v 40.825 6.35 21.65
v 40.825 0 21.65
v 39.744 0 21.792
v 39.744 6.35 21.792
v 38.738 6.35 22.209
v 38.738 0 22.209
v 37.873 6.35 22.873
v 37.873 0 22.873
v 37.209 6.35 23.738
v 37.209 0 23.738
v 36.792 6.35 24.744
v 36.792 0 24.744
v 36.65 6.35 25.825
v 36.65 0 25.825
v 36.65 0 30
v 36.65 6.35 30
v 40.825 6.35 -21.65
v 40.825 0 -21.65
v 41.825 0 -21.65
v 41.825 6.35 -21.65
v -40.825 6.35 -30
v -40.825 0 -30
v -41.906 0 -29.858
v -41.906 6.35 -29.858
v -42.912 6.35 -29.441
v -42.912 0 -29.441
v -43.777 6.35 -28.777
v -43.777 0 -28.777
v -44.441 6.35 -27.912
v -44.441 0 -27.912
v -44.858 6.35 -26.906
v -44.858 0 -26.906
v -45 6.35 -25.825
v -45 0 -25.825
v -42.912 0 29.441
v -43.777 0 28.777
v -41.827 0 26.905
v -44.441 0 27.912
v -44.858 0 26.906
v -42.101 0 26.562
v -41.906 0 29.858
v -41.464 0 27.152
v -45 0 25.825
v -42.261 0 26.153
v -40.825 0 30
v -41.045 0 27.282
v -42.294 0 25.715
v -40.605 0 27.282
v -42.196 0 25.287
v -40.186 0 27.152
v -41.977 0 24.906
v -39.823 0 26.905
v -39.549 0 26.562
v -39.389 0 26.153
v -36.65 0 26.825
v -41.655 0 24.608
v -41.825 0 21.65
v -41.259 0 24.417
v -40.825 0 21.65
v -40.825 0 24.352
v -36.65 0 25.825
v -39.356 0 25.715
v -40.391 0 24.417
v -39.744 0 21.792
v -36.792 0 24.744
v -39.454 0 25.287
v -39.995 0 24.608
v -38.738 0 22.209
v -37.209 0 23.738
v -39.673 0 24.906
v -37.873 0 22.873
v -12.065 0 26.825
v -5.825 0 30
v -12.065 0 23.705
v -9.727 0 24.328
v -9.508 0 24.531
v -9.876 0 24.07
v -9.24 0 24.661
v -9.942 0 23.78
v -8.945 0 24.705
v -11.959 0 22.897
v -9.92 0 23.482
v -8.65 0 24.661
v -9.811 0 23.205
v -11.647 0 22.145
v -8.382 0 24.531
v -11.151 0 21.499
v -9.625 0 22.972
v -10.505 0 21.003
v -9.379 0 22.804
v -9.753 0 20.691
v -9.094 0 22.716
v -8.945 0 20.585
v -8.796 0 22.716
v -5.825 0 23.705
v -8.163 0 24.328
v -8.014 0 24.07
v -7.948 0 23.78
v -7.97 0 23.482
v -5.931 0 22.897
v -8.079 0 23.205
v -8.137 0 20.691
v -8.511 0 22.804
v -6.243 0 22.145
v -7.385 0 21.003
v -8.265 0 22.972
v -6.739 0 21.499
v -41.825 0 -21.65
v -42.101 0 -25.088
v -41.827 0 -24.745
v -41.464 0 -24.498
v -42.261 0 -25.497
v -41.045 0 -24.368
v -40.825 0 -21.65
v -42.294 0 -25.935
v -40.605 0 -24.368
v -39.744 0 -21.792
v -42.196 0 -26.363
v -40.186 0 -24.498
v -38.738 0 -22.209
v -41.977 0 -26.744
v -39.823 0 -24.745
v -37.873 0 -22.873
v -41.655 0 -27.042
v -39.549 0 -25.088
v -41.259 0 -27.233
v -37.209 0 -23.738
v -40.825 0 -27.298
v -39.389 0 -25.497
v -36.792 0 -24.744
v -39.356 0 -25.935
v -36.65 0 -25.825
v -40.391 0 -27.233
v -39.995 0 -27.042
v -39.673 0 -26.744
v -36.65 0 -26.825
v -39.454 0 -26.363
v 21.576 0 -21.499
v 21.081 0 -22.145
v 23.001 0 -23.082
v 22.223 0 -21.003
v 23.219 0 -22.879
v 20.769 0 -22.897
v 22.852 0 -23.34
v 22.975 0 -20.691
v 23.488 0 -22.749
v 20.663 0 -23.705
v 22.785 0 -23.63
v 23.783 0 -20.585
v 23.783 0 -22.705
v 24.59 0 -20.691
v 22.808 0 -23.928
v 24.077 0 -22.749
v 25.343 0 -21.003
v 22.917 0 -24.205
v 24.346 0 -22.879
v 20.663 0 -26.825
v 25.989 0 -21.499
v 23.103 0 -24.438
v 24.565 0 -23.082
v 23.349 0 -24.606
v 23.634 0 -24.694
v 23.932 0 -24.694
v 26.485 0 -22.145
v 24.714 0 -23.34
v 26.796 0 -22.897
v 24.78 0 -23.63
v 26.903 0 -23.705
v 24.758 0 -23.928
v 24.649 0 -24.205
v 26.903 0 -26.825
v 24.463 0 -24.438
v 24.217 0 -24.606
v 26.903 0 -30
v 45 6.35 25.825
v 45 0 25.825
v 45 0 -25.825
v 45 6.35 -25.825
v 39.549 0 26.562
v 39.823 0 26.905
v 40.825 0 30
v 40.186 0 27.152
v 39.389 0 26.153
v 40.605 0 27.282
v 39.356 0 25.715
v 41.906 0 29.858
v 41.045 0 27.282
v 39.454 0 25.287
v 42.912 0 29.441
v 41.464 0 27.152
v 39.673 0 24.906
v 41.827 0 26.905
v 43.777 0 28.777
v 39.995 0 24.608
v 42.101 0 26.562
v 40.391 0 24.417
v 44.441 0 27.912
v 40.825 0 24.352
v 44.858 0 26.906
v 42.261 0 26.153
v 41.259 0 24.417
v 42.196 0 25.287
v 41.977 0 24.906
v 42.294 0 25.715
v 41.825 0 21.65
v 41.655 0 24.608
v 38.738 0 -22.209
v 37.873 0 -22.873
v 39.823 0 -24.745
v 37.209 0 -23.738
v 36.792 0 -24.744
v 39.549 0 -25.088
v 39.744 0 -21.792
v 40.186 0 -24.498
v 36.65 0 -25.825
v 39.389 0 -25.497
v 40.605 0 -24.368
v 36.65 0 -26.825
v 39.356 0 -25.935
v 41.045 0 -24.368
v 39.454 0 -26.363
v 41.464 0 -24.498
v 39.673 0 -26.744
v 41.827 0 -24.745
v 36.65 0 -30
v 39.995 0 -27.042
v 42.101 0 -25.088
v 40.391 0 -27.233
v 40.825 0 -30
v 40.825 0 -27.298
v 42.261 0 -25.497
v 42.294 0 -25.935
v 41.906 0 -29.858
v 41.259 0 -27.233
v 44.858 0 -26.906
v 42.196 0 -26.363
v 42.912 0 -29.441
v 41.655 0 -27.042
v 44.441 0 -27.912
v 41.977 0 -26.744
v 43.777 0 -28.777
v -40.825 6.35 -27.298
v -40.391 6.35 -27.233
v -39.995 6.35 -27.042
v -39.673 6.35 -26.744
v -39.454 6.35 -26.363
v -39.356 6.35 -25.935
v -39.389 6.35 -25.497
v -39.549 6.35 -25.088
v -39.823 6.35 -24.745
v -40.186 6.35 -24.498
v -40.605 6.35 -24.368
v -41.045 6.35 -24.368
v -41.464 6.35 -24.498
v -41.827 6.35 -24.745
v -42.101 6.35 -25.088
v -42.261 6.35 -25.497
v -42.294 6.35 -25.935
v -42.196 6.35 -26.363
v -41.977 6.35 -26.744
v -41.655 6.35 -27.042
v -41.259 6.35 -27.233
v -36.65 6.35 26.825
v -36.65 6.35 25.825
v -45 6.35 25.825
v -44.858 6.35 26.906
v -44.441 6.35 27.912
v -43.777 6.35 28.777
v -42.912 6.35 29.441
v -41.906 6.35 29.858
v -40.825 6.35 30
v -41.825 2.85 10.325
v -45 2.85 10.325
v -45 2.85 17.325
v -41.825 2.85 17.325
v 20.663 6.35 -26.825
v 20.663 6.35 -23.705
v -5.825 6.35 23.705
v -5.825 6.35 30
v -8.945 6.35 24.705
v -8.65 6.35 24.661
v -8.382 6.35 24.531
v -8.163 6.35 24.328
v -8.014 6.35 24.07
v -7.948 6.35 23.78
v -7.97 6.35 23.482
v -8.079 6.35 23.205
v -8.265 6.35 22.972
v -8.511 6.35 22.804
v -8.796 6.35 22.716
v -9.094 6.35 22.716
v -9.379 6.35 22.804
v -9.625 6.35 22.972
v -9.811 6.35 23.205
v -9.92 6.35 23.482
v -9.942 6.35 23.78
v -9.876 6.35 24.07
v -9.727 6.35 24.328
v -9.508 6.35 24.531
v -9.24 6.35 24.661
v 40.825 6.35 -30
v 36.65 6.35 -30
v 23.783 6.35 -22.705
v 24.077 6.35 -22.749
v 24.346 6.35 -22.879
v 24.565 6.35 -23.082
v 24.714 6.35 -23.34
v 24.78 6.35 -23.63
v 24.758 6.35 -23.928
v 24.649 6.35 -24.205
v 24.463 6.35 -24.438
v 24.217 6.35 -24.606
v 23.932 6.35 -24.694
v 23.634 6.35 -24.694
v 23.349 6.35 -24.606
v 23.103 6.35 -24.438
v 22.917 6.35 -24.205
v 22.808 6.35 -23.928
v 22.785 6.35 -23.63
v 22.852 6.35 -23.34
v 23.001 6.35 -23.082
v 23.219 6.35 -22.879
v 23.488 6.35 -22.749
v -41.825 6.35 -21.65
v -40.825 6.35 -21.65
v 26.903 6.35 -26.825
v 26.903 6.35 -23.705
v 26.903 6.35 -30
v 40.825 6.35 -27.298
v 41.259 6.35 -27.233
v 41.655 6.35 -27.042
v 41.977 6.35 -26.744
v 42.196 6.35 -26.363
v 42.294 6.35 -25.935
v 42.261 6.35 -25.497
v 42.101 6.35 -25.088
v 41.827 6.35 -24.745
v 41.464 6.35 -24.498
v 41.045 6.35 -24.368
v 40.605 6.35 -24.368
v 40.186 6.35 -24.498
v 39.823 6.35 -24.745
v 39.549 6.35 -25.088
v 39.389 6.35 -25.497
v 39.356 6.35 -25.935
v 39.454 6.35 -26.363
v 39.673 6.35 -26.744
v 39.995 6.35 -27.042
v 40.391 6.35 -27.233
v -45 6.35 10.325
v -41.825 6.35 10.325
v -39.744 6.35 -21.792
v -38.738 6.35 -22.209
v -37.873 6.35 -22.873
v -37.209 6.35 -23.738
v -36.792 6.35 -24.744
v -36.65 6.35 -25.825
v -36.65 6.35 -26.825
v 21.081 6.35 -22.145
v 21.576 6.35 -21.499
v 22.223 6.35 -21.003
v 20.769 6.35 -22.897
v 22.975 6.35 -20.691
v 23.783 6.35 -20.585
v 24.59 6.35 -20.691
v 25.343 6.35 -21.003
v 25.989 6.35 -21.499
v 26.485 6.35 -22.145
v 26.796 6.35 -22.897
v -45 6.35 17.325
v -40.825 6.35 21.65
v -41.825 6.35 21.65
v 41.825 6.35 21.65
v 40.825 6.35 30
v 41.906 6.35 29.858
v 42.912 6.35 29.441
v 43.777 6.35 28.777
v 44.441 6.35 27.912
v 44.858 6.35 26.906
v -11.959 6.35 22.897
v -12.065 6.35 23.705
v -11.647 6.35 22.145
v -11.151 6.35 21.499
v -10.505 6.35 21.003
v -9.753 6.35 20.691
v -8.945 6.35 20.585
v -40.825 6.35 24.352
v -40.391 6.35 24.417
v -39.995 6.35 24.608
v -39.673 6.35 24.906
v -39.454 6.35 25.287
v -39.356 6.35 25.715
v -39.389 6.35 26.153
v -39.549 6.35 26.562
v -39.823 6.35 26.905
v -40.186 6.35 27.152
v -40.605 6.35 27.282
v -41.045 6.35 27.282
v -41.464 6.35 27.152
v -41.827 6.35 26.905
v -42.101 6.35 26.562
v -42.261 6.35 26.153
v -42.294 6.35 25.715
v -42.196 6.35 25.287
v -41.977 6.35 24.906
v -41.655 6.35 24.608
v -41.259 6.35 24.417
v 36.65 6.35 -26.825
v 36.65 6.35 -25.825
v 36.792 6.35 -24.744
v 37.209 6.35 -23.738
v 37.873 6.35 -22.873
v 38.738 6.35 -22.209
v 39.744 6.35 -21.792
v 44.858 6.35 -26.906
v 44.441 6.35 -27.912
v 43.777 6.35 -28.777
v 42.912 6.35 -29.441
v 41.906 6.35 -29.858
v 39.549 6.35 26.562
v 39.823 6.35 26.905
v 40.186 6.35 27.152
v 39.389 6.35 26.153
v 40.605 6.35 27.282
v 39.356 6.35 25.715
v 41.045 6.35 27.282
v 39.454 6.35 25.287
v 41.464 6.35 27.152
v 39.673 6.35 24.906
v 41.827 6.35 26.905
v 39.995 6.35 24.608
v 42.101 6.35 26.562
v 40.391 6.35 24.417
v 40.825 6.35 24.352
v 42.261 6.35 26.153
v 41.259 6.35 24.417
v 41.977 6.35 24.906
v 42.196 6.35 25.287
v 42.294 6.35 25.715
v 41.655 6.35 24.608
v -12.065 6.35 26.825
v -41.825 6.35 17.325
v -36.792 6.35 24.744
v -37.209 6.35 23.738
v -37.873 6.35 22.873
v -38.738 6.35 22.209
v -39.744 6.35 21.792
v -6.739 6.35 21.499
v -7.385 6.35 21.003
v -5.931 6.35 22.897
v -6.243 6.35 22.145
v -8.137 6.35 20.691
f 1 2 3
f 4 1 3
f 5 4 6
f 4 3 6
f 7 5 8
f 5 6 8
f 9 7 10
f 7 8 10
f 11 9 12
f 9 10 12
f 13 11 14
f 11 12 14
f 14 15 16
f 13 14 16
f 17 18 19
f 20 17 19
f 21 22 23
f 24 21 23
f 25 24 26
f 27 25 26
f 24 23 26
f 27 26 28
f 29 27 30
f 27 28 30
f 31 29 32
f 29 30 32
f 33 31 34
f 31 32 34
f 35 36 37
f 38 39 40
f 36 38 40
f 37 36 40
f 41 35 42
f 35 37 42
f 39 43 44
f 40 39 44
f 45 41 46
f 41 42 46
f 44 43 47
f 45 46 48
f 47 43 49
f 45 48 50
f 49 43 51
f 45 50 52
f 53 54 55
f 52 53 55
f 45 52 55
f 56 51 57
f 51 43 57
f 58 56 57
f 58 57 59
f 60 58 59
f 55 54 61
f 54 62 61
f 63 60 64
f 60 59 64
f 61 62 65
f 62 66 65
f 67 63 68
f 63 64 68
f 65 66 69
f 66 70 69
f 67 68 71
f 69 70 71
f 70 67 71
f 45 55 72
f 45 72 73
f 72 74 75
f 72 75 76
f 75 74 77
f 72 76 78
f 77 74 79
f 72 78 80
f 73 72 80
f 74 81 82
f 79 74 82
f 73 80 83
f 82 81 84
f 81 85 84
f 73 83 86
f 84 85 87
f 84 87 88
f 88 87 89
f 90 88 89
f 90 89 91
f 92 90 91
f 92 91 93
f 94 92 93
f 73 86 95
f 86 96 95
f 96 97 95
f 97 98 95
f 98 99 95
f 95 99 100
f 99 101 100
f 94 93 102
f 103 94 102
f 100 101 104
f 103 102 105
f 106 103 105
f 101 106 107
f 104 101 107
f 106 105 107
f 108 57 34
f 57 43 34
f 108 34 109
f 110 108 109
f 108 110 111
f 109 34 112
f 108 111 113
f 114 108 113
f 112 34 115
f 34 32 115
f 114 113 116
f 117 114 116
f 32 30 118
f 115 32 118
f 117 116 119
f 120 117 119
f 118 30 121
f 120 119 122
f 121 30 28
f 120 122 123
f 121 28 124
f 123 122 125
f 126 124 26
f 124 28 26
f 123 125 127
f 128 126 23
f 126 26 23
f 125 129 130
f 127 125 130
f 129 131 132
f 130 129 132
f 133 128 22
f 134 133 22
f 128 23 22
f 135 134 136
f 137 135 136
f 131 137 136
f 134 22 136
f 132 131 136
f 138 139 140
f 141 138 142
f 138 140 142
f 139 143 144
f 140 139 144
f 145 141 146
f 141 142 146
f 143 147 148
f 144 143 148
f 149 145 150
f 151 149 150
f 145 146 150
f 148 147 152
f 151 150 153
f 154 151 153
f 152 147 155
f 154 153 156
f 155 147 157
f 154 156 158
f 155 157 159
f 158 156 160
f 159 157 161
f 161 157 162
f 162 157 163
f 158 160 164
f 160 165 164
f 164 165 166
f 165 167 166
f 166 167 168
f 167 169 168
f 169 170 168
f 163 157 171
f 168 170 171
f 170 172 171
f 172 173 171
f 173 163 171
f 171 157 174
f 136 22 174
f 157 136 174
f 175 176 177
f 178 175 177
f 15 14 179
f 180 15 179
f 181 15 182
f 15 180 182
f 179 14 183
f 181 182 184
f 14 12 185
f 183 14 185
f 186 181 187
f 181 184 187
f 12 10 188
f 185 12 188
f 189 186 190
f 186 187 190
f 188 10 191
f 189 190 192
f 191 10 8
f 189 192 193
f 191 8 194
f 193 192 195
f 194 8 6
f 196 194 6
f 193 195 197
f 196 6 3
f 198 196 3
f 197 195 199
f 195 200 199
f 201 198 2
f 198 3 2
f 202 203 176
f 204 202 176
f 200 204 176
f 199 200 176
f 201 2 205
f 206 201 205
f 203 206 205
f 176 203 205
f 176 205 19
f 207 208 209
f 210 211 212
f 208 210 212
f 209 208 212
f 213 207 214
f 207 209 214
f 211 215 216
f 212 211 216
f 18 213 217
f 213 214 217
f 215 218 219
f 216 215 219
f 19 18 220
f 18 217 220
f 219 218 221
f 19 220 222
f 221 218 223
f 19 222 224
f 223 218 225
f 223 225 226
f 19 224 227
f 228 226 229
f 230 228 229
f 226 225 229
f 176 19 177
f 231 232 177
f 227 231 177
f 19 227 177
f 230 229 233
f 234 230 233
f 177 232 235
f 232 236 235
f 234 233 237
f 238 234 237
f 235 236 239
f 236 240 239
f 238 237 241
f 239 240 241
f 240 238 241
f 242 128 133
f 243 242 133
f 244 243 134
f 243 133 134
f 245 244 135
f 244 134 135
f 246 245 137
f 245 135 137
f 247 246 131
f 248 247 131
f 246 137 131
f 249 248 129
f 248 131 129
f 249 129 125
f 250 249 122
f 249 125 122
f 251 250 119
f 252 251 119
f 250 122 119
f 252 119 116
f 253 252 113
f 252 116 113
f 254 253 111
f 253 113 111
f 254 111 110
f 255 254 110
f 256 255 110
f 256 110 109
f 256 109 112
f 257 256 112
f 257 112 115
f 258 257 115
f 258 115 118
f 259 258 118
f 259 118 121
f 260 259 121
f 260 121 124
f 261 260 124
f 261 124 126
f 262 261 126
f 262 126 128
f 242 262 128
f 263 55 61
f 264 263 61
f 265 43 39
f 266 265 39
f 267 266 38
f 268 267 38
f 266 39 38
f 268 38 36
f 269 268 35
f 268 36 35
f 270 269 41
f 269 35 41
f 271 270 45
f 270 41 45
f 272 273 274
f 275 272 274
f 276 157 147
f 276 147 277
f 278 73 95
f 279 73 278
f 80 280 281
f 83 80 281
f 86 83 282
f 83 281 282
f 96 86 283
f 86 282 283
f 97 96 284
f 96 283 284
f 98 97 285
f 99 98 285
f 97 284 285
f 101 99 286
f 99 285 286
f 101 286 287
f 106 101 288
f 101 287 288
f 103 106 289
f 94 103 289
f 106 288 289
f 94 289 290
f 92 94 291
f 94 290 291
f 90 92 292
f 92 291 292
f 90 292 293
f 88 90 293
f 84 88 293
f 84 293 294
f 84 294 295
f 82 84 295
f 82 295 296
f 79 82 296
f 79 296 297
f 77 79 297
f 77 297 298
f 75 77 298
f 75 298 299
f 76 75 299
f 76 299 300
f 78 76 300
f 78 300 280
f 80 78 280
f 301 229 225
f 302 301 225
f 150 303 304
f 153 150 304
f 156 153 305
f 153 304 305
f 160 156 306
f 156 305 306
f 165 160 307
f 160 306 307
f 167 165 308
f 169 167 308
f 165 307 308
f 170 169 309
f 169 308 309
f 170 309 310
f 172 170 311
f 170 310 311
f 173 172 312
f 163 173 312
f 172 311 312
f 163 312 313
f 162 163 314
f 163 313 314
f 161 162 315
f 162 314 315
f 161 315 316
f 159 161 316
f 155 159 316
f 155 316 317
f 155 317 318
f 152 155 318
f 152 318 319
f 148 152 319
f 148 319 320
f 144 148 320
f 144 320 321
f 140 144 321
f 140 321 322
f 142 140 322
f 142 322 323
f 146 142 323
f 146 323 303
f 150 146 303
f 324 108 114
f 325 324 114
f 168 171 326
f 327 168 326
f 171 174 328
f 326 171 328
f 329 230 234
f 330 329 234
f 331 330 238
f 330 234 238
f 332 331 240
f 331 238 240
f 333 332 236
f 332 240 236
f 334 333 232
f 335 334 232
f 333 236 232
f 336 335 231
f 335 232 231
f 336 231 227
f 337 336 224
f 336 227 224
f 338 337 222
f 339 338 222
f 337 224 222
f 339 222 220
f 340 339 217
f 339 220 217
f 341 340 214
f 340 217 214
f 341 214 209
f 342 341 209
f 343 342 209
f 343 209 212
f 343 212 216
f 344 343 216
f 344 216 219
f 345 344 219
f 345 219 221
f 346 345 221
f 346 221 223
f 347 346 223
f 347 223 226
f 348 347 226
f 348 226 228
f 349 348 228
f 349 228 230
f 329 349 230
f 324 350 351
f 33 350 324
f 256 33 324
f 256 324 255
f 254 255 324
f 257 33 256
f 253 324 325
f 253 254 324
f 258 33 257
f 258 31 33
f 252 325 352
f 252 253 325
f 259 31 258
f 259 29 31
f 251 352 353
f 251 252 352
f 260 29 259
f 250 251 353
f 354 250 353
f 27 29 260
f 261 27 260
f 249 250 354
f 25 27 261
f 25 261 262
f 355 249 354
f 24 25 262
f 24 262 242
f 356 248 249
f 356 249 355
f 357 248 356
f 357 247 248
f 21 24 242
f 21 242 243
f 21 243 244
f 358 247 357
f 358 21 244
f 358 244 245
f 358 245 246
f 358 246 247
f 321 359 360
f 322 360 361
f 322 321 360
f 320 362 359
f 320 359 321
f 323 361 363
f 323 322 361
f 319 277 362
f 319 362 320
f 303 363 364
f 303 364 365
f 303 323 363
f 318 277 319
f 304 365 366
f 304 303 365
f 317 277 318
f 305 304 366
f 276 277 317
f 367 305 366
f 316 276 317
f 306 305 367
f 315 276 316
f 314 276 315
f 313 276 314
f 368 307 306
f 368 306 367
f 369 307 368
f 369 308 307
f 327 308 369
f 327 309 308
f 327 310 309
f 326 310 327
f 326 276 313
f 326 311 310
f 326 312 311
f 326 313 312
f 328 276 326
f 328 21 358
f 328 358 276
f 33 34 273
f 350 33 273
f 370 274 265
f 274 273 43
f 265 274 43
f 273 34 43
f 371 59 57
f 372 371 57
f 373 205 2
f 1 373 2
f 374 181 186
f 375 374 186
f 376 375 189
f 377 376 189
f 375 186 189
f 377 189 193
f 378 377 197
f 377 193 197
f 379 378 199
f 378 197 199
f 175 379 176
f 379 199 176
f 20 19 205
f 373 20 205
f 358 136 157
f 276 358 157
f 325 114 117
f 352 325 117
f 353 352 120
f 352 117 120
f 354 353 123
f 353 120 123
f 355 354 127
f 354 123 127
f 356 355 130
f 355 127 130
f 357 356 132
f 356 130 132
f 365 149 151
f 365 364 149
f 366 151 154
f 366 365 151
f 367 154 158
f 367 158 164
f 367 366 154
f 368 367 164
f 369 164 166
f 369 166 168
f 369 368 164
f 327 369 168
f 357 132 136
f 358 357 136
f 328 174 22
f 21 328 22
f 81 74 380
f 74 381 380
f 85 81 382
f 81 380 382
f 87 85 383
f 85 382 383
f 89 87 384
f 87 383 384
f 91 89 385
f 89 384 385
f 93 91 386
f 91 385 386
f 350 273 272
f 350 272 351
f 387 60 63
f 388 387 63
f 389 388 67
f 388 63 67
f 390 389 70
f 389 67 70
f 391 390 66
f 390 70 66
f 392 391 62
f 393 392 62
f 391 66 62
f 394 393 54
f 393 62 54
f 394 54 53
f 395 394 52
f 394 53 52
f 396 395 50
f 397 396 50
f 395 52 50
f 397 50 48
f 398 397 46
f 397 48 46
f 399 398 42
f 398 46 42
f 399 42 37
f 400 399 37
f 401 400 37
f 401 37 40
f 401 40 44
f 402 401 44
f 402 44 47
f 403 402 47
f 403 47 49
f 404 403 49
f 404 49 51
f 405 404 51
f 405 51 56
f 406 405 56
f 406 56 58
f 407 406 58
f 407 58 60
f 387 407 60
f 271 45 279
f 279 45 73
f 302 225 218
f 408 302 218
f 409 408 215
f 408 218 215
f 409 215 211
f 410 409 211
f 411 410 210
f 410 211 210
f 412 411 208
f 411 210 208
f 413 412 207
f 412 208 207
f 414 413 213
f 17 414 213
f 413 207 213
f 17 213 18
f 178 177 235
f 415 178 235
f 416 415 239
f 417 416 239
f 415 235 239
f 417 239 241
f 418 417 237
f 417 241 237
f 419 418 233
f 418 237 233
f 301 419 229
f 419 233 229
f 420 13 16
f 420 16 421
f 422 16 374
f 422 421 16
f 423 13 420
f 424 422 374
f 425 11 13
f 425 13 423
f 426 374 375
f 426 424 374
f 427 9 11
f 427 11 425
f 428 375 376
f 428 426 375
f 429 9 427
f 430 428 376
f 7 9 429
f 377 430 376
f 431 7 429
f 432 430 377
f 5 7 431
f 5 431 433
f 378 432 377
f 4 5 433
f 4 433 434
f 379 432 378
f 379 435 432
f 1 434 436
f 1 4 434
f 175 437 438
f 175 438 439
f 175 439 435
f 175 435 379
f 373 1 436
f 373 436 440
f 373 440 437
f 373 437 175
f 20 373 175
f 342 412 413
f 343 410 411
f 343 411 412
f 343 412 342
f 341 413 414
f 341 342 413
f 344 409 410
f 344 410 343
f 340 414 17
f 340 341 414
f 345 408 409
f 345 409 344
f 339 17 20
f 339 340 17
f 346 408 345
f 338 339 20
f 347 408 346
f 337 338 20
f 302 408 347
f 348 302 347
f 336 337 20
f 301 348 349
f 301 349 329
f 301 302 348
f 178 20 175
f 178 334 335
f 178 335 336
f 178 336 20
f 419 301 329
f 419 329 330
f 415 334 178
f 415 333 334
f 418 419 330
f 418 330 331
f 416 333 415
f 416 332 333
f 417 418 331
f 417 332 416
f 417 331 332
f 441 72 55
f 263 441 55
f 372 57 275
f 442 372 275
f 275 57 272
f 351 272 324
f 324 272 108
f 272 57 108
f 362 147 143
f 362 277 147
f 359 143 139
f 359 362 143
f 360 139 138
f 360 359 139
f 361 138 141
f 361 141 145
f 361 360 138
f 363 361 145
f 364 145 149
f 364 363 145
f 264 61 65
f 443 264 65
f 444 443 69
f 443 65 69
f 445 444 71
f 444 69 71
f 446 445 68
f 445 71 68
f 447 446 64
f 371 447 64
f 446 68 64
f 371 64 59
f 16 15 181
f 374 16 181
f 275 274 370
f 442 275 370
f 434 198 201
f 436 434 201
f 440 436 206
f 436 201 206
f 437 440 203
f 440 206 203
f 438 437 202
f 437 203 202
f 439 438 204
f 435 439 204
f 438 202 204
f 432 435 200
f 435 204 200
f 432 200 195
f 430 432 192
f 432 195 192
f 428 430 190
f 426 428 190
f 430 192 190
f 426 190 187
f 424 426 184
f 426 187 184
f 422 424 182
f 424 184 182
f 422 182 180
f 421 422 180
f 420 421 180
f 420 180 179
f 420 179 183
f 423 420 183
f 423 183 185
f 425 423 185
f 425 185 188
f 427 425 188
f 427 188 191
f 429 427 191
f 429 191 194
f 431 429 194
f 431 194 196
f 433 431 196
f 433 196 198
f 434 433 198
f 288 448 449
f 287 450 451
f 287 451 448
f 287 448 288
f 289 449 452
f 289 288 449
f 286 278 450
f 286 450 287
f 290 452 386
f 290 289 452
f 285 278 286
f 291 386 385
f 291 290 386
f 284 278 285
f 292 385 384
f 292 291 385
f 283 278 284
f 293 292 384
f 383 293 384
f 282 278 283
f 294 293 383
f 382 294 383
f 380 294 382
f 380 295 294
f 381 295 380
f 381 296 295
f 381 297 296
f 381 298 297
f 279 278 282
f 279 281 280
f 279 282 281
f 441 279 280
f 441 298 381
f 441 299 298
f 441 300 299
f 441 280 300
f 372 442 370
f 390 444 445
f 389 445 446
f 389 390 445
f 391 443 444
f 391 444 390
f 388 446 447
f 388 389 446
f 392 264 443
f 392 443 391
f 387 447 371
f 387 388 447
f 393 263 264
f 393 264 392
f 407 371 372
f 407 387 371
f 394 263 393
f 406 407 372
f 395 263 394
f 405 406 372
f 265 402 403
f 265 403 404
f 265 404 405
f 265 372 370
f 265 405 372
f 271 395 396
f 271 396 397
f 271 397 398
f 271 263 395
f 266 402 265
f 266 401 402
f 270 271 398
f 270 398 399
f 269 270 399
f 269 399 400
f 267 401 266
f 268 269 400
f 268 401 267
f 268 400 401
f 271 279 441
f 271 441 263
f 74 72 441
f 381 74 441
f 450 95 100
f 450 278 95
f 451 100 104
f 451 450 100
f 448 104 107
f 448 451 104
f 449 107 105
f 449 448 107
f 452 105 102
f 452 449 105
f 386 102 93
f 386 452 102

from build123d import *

# Parameters (mm, degrees)
BOSS_EXTRUDE3_DEPTH = 6.35
SKETCH3_W           = 9.747311717
SKETCH3_H           = 6.35
CUT_EXTRUDE1_DEPTH  = 3.175
SKETCH4_W           = 42.475
SKETCH4_H           = 6.35
CUT_EXTRUDE2_DEPTH  = 8.35
SKETCH5_W           = 7
SKETCH5_H           = 7
CUT_EXTRUDE3_DEPTH  = 3.175
SKETCH7_R           = 1.4732
CUT_EXTRUDE4_DEPTH  = 10
SKETCH10_W          = 6.24
SKETCH10_H          = 6.35
BOSS_EXTRUDE4_DEPTH = 6.24
SKETCH11_W          = 6.24
SKETCH11_H          = 6.35
BOSS_EXTRUDE5_DEPTH = 6.24
SKETCH12_R          = 1
CUT_EXTRUDE5_DEPTH  = 55.454774814
SKETCH13_R          = 1
CUT_EXTRUDE6_DEPTH  = 55.454774814
FILLET1_R           = 3.12


with BuildPart() as part:
    # Sketch2 → Boss-Extrude3 (new body)
    with BuildSketch(Plane(origin=(0, 0, 0), x_dir=(1, 0, 0), z_dir=(0, 1, 0))):
        with BuildLine():
            Line((-45, 25.825), (-45, -25.825))
            ThreePointArc((-45, -25.825), (-43.777170811, -28.777170811), (-40.825, -30))
            Line((-40.825, -30), (40.825, -30))
            ThreePointArc((40.825, -30), (43.777170811, -28.777170811), (45, -25.825))
            Line((45, -25.825), (45, 25.825))
            ThreePointArc((45, 25.825), (43.777170811, 28.777170811), (40.825, 30))
            Line((40.825, 30), (-40.825, 30))
            ThreePointArc((-40.825, 30), (-43.777170811, 28.777170811), (-45, 25.825))
        make_face()
        with BuildLine():
            Line((40.825, 21.65), (41.825, 21.65))
            Line((41.825, 21.65), (41.825, -21.65))
            Line((41.825, -21.65), (40.825, -21.65))
            ThreePointArc((40.825, -21.65), (37.872829189, -22.872829189), (36.65, -25.825))
            Line((36.65, -25.825), (36.65, -26.825))
            Line((36.65, -26.825), (-36.65, -26.825))
            Line((-36.65, -26.825), (-36.65, -25.825))
            ThreePointArc((-36.65, -25.825), (-37.872829189, -22.872829189), (-40.825, -21.65))
            Line((-40.825, -21.65), (-41.825, -21.65))
            Line((-41.825, -21.65), (-41.825, 21.65))
            Line((-41.825, 21.65), (-40.825, 21.65))
            ThreePointArc((-40.825, 21.65), (-37.872829189, 22.872829189), (-36.65, 25.825))
            Line((-36.65, 25.825), (-36.65, 26.825))
            Line((-36.65, 26.825), (36.65, 26.825))
            Line((36.65, 26.825), (36.65, 25.825))
            ThreePointArc((36.65, 25.825), (37.872829189, 22.872829189), (40.825, 21.65))
        make_face(mode=Mode.SUBTRACT)
    extrude(amount=BOSS_EXTRUDE3_DEPTH)

    # Sketch3 → Cut-Extrude1 (cut)
    with BuildSketch(Plane(origin=(0, 0, -30), x_dir=(-1, 0, 0), z_dir=(0, 0, -1))):
        with Locations((-31.776344142, 3.175)):
            Rectangle(SKETCH3_W, SKETCH3_H)
    extrude(amount=-CUT_EXTRUDE1_DEPTH, mode=Mode.SUBTRACT)

    # Sketch4 → Cut-Extrude2 (cut)
    with BuildSketch(Plane.XY.offset(30)):
        with Locations((15.4125, 3.175)):
            Rectangle(SKETCH4_W, SKETCH4_H)
    extrude(amount=-CUT_EXTRUDE2_DEPTH, mode=Mode.SUBTRACT)


with BuildPart() as cut_extrude2_piece_1:
    # of the separate pieces the step leaves, piece 1, a body of its own (cut_extrude2_pieces)
    add(part.part.solids().sort_by_distance((-40.825, 0, 30))[0])

    # Sketch5 → Cut-Extrude3 (cut)
    with BuildSketch(Plane.ZY.offset(45)):
        with Locations((13.825, 6.35)):
            Rectangle(SKETCH5_W, SKETCH5_H)
    extrude(amount=-CUT_EXTRUDE3_DEPTH, mode=Mode.SUBTRACT)


with BuildPart() as cut_extrude2_piece_2:
    # of the separate pieces the step leaves, piece 2, a body of its own (cut_extrude2_pieces)
    add(part.part.solids().sort_by_distance((40.825, 0, -30))[0])


with BuildPart() as cut_extrude4_tool:
    # Sketch7 → Cut-Extrude4 (new body)
    with BuildSketch(Plane.XZ):
        with Locations(Location((-40.825, -25.825, 0), (0, 0, 270))):
            Circle(SKETCH7_R)
        with Locations(Location((-40.825, 25.825, 0), (0, 0, 270))):
            Circle(SKETCH7_R)
        with Locations(Location((40.825, 25.825, 0), (0, 0, 270))):
            Circle(SKETCH7_R)
        with Locations(Location((40.825, -25.825, 0), (0, 0, 270))):
            Circle(SKETCH7_R)
    extrude(amount=-CUT_EXTRUDE4_DEPTH)


with BuildPart() as cut_extrude2_piece_1_1:
    add(cut_extrude2_piece_1.part)

    # Cut-Extrude4: cut by cut_extrude4_tool
    add(cut_extrude4_tool.part, mode=Mode.SUBTRACT)

    # Sketch10 → Boss-Extrude4 (add)
    with BuildSketch(Plane(origin=(0, 0, 26.825), x_dir=(-1, 0, 0), z_dir=(0, 0, -1))):
        with Locations((8.945, 3.175)):
            Rectangle(SKETCH10_W, SKETCH10_H)
    extrude(amount=BOSS_EXTRUDE4_DEPTH)

    # Sketch11 → Boss-Extrude5 (add)
    with BuildSketch(Plane.XY.offset(-26.825)):
        with Locations((23.782688283, 3.175)):
            Rectangle(SKETCH11_W, SKETCH11_H)
    extrude(amount=BOSS_EXTRUDE5_DEPTH)

    # Sketch12 → Cut-Extrude5 (cut, through all)
    with BuildSketch(Plane(origin=(0, 6.35, 0), x_dir=(1, 0, 0), z_dir=(0, 1, 0))):
        with Locations(Location((23.782688283, 23.705, 0), (0, 0, 270))):
            Circle(SKETCH12_R)
    extrude(amount=-CUT_EXTRUDE5_DEPTH, mode=Mode.SUBTRACT)

    # Sketch13 → Cut-Extrude6 (cut, through all)
    with BuildSketch(Plane(origin=(0, 6.35, 0), x_dir=(1, 0, 0), z_dir=(0, 1, 0))):
        with Locations(Location((-8.945, -23.705, 0), (0, 0, 270))):
            Circle(SKETCH13_R)
    extrude(amount=-CUT_EXTRUDE6_DEPTH, mode=Mode.SUBTRACT)

    # Fillet1
    fillet1_edges = [cut_extrude2_piece_1_1.edges().sort_by_distance(p)[0] for p in [
        (26.902688283, 3.175, -20.585),
        (20.662688283, 3.175, -20.585),
        (-5.825, 3.175, 20.585),
        (-12.065, 3.175, 20.585),
    ]]
    fillet(fillet1_edges, radius=FILLET1_R - 0.0001)  # a hair under: the kernel refuses the full size


with BuildPart() as cut_extrude2_piece_2_1:
    add(cut_extrude2_piece_2.part)

    # Cut-Extrude4: cut by cut_extrude4_tool
    add(cut_extrude4_tool.part, mode=Mode.SUBTRACT)


solid = Compound([cut_extrude2_piece_1_1.part, cut_extrude2_piece_2_1.part])
